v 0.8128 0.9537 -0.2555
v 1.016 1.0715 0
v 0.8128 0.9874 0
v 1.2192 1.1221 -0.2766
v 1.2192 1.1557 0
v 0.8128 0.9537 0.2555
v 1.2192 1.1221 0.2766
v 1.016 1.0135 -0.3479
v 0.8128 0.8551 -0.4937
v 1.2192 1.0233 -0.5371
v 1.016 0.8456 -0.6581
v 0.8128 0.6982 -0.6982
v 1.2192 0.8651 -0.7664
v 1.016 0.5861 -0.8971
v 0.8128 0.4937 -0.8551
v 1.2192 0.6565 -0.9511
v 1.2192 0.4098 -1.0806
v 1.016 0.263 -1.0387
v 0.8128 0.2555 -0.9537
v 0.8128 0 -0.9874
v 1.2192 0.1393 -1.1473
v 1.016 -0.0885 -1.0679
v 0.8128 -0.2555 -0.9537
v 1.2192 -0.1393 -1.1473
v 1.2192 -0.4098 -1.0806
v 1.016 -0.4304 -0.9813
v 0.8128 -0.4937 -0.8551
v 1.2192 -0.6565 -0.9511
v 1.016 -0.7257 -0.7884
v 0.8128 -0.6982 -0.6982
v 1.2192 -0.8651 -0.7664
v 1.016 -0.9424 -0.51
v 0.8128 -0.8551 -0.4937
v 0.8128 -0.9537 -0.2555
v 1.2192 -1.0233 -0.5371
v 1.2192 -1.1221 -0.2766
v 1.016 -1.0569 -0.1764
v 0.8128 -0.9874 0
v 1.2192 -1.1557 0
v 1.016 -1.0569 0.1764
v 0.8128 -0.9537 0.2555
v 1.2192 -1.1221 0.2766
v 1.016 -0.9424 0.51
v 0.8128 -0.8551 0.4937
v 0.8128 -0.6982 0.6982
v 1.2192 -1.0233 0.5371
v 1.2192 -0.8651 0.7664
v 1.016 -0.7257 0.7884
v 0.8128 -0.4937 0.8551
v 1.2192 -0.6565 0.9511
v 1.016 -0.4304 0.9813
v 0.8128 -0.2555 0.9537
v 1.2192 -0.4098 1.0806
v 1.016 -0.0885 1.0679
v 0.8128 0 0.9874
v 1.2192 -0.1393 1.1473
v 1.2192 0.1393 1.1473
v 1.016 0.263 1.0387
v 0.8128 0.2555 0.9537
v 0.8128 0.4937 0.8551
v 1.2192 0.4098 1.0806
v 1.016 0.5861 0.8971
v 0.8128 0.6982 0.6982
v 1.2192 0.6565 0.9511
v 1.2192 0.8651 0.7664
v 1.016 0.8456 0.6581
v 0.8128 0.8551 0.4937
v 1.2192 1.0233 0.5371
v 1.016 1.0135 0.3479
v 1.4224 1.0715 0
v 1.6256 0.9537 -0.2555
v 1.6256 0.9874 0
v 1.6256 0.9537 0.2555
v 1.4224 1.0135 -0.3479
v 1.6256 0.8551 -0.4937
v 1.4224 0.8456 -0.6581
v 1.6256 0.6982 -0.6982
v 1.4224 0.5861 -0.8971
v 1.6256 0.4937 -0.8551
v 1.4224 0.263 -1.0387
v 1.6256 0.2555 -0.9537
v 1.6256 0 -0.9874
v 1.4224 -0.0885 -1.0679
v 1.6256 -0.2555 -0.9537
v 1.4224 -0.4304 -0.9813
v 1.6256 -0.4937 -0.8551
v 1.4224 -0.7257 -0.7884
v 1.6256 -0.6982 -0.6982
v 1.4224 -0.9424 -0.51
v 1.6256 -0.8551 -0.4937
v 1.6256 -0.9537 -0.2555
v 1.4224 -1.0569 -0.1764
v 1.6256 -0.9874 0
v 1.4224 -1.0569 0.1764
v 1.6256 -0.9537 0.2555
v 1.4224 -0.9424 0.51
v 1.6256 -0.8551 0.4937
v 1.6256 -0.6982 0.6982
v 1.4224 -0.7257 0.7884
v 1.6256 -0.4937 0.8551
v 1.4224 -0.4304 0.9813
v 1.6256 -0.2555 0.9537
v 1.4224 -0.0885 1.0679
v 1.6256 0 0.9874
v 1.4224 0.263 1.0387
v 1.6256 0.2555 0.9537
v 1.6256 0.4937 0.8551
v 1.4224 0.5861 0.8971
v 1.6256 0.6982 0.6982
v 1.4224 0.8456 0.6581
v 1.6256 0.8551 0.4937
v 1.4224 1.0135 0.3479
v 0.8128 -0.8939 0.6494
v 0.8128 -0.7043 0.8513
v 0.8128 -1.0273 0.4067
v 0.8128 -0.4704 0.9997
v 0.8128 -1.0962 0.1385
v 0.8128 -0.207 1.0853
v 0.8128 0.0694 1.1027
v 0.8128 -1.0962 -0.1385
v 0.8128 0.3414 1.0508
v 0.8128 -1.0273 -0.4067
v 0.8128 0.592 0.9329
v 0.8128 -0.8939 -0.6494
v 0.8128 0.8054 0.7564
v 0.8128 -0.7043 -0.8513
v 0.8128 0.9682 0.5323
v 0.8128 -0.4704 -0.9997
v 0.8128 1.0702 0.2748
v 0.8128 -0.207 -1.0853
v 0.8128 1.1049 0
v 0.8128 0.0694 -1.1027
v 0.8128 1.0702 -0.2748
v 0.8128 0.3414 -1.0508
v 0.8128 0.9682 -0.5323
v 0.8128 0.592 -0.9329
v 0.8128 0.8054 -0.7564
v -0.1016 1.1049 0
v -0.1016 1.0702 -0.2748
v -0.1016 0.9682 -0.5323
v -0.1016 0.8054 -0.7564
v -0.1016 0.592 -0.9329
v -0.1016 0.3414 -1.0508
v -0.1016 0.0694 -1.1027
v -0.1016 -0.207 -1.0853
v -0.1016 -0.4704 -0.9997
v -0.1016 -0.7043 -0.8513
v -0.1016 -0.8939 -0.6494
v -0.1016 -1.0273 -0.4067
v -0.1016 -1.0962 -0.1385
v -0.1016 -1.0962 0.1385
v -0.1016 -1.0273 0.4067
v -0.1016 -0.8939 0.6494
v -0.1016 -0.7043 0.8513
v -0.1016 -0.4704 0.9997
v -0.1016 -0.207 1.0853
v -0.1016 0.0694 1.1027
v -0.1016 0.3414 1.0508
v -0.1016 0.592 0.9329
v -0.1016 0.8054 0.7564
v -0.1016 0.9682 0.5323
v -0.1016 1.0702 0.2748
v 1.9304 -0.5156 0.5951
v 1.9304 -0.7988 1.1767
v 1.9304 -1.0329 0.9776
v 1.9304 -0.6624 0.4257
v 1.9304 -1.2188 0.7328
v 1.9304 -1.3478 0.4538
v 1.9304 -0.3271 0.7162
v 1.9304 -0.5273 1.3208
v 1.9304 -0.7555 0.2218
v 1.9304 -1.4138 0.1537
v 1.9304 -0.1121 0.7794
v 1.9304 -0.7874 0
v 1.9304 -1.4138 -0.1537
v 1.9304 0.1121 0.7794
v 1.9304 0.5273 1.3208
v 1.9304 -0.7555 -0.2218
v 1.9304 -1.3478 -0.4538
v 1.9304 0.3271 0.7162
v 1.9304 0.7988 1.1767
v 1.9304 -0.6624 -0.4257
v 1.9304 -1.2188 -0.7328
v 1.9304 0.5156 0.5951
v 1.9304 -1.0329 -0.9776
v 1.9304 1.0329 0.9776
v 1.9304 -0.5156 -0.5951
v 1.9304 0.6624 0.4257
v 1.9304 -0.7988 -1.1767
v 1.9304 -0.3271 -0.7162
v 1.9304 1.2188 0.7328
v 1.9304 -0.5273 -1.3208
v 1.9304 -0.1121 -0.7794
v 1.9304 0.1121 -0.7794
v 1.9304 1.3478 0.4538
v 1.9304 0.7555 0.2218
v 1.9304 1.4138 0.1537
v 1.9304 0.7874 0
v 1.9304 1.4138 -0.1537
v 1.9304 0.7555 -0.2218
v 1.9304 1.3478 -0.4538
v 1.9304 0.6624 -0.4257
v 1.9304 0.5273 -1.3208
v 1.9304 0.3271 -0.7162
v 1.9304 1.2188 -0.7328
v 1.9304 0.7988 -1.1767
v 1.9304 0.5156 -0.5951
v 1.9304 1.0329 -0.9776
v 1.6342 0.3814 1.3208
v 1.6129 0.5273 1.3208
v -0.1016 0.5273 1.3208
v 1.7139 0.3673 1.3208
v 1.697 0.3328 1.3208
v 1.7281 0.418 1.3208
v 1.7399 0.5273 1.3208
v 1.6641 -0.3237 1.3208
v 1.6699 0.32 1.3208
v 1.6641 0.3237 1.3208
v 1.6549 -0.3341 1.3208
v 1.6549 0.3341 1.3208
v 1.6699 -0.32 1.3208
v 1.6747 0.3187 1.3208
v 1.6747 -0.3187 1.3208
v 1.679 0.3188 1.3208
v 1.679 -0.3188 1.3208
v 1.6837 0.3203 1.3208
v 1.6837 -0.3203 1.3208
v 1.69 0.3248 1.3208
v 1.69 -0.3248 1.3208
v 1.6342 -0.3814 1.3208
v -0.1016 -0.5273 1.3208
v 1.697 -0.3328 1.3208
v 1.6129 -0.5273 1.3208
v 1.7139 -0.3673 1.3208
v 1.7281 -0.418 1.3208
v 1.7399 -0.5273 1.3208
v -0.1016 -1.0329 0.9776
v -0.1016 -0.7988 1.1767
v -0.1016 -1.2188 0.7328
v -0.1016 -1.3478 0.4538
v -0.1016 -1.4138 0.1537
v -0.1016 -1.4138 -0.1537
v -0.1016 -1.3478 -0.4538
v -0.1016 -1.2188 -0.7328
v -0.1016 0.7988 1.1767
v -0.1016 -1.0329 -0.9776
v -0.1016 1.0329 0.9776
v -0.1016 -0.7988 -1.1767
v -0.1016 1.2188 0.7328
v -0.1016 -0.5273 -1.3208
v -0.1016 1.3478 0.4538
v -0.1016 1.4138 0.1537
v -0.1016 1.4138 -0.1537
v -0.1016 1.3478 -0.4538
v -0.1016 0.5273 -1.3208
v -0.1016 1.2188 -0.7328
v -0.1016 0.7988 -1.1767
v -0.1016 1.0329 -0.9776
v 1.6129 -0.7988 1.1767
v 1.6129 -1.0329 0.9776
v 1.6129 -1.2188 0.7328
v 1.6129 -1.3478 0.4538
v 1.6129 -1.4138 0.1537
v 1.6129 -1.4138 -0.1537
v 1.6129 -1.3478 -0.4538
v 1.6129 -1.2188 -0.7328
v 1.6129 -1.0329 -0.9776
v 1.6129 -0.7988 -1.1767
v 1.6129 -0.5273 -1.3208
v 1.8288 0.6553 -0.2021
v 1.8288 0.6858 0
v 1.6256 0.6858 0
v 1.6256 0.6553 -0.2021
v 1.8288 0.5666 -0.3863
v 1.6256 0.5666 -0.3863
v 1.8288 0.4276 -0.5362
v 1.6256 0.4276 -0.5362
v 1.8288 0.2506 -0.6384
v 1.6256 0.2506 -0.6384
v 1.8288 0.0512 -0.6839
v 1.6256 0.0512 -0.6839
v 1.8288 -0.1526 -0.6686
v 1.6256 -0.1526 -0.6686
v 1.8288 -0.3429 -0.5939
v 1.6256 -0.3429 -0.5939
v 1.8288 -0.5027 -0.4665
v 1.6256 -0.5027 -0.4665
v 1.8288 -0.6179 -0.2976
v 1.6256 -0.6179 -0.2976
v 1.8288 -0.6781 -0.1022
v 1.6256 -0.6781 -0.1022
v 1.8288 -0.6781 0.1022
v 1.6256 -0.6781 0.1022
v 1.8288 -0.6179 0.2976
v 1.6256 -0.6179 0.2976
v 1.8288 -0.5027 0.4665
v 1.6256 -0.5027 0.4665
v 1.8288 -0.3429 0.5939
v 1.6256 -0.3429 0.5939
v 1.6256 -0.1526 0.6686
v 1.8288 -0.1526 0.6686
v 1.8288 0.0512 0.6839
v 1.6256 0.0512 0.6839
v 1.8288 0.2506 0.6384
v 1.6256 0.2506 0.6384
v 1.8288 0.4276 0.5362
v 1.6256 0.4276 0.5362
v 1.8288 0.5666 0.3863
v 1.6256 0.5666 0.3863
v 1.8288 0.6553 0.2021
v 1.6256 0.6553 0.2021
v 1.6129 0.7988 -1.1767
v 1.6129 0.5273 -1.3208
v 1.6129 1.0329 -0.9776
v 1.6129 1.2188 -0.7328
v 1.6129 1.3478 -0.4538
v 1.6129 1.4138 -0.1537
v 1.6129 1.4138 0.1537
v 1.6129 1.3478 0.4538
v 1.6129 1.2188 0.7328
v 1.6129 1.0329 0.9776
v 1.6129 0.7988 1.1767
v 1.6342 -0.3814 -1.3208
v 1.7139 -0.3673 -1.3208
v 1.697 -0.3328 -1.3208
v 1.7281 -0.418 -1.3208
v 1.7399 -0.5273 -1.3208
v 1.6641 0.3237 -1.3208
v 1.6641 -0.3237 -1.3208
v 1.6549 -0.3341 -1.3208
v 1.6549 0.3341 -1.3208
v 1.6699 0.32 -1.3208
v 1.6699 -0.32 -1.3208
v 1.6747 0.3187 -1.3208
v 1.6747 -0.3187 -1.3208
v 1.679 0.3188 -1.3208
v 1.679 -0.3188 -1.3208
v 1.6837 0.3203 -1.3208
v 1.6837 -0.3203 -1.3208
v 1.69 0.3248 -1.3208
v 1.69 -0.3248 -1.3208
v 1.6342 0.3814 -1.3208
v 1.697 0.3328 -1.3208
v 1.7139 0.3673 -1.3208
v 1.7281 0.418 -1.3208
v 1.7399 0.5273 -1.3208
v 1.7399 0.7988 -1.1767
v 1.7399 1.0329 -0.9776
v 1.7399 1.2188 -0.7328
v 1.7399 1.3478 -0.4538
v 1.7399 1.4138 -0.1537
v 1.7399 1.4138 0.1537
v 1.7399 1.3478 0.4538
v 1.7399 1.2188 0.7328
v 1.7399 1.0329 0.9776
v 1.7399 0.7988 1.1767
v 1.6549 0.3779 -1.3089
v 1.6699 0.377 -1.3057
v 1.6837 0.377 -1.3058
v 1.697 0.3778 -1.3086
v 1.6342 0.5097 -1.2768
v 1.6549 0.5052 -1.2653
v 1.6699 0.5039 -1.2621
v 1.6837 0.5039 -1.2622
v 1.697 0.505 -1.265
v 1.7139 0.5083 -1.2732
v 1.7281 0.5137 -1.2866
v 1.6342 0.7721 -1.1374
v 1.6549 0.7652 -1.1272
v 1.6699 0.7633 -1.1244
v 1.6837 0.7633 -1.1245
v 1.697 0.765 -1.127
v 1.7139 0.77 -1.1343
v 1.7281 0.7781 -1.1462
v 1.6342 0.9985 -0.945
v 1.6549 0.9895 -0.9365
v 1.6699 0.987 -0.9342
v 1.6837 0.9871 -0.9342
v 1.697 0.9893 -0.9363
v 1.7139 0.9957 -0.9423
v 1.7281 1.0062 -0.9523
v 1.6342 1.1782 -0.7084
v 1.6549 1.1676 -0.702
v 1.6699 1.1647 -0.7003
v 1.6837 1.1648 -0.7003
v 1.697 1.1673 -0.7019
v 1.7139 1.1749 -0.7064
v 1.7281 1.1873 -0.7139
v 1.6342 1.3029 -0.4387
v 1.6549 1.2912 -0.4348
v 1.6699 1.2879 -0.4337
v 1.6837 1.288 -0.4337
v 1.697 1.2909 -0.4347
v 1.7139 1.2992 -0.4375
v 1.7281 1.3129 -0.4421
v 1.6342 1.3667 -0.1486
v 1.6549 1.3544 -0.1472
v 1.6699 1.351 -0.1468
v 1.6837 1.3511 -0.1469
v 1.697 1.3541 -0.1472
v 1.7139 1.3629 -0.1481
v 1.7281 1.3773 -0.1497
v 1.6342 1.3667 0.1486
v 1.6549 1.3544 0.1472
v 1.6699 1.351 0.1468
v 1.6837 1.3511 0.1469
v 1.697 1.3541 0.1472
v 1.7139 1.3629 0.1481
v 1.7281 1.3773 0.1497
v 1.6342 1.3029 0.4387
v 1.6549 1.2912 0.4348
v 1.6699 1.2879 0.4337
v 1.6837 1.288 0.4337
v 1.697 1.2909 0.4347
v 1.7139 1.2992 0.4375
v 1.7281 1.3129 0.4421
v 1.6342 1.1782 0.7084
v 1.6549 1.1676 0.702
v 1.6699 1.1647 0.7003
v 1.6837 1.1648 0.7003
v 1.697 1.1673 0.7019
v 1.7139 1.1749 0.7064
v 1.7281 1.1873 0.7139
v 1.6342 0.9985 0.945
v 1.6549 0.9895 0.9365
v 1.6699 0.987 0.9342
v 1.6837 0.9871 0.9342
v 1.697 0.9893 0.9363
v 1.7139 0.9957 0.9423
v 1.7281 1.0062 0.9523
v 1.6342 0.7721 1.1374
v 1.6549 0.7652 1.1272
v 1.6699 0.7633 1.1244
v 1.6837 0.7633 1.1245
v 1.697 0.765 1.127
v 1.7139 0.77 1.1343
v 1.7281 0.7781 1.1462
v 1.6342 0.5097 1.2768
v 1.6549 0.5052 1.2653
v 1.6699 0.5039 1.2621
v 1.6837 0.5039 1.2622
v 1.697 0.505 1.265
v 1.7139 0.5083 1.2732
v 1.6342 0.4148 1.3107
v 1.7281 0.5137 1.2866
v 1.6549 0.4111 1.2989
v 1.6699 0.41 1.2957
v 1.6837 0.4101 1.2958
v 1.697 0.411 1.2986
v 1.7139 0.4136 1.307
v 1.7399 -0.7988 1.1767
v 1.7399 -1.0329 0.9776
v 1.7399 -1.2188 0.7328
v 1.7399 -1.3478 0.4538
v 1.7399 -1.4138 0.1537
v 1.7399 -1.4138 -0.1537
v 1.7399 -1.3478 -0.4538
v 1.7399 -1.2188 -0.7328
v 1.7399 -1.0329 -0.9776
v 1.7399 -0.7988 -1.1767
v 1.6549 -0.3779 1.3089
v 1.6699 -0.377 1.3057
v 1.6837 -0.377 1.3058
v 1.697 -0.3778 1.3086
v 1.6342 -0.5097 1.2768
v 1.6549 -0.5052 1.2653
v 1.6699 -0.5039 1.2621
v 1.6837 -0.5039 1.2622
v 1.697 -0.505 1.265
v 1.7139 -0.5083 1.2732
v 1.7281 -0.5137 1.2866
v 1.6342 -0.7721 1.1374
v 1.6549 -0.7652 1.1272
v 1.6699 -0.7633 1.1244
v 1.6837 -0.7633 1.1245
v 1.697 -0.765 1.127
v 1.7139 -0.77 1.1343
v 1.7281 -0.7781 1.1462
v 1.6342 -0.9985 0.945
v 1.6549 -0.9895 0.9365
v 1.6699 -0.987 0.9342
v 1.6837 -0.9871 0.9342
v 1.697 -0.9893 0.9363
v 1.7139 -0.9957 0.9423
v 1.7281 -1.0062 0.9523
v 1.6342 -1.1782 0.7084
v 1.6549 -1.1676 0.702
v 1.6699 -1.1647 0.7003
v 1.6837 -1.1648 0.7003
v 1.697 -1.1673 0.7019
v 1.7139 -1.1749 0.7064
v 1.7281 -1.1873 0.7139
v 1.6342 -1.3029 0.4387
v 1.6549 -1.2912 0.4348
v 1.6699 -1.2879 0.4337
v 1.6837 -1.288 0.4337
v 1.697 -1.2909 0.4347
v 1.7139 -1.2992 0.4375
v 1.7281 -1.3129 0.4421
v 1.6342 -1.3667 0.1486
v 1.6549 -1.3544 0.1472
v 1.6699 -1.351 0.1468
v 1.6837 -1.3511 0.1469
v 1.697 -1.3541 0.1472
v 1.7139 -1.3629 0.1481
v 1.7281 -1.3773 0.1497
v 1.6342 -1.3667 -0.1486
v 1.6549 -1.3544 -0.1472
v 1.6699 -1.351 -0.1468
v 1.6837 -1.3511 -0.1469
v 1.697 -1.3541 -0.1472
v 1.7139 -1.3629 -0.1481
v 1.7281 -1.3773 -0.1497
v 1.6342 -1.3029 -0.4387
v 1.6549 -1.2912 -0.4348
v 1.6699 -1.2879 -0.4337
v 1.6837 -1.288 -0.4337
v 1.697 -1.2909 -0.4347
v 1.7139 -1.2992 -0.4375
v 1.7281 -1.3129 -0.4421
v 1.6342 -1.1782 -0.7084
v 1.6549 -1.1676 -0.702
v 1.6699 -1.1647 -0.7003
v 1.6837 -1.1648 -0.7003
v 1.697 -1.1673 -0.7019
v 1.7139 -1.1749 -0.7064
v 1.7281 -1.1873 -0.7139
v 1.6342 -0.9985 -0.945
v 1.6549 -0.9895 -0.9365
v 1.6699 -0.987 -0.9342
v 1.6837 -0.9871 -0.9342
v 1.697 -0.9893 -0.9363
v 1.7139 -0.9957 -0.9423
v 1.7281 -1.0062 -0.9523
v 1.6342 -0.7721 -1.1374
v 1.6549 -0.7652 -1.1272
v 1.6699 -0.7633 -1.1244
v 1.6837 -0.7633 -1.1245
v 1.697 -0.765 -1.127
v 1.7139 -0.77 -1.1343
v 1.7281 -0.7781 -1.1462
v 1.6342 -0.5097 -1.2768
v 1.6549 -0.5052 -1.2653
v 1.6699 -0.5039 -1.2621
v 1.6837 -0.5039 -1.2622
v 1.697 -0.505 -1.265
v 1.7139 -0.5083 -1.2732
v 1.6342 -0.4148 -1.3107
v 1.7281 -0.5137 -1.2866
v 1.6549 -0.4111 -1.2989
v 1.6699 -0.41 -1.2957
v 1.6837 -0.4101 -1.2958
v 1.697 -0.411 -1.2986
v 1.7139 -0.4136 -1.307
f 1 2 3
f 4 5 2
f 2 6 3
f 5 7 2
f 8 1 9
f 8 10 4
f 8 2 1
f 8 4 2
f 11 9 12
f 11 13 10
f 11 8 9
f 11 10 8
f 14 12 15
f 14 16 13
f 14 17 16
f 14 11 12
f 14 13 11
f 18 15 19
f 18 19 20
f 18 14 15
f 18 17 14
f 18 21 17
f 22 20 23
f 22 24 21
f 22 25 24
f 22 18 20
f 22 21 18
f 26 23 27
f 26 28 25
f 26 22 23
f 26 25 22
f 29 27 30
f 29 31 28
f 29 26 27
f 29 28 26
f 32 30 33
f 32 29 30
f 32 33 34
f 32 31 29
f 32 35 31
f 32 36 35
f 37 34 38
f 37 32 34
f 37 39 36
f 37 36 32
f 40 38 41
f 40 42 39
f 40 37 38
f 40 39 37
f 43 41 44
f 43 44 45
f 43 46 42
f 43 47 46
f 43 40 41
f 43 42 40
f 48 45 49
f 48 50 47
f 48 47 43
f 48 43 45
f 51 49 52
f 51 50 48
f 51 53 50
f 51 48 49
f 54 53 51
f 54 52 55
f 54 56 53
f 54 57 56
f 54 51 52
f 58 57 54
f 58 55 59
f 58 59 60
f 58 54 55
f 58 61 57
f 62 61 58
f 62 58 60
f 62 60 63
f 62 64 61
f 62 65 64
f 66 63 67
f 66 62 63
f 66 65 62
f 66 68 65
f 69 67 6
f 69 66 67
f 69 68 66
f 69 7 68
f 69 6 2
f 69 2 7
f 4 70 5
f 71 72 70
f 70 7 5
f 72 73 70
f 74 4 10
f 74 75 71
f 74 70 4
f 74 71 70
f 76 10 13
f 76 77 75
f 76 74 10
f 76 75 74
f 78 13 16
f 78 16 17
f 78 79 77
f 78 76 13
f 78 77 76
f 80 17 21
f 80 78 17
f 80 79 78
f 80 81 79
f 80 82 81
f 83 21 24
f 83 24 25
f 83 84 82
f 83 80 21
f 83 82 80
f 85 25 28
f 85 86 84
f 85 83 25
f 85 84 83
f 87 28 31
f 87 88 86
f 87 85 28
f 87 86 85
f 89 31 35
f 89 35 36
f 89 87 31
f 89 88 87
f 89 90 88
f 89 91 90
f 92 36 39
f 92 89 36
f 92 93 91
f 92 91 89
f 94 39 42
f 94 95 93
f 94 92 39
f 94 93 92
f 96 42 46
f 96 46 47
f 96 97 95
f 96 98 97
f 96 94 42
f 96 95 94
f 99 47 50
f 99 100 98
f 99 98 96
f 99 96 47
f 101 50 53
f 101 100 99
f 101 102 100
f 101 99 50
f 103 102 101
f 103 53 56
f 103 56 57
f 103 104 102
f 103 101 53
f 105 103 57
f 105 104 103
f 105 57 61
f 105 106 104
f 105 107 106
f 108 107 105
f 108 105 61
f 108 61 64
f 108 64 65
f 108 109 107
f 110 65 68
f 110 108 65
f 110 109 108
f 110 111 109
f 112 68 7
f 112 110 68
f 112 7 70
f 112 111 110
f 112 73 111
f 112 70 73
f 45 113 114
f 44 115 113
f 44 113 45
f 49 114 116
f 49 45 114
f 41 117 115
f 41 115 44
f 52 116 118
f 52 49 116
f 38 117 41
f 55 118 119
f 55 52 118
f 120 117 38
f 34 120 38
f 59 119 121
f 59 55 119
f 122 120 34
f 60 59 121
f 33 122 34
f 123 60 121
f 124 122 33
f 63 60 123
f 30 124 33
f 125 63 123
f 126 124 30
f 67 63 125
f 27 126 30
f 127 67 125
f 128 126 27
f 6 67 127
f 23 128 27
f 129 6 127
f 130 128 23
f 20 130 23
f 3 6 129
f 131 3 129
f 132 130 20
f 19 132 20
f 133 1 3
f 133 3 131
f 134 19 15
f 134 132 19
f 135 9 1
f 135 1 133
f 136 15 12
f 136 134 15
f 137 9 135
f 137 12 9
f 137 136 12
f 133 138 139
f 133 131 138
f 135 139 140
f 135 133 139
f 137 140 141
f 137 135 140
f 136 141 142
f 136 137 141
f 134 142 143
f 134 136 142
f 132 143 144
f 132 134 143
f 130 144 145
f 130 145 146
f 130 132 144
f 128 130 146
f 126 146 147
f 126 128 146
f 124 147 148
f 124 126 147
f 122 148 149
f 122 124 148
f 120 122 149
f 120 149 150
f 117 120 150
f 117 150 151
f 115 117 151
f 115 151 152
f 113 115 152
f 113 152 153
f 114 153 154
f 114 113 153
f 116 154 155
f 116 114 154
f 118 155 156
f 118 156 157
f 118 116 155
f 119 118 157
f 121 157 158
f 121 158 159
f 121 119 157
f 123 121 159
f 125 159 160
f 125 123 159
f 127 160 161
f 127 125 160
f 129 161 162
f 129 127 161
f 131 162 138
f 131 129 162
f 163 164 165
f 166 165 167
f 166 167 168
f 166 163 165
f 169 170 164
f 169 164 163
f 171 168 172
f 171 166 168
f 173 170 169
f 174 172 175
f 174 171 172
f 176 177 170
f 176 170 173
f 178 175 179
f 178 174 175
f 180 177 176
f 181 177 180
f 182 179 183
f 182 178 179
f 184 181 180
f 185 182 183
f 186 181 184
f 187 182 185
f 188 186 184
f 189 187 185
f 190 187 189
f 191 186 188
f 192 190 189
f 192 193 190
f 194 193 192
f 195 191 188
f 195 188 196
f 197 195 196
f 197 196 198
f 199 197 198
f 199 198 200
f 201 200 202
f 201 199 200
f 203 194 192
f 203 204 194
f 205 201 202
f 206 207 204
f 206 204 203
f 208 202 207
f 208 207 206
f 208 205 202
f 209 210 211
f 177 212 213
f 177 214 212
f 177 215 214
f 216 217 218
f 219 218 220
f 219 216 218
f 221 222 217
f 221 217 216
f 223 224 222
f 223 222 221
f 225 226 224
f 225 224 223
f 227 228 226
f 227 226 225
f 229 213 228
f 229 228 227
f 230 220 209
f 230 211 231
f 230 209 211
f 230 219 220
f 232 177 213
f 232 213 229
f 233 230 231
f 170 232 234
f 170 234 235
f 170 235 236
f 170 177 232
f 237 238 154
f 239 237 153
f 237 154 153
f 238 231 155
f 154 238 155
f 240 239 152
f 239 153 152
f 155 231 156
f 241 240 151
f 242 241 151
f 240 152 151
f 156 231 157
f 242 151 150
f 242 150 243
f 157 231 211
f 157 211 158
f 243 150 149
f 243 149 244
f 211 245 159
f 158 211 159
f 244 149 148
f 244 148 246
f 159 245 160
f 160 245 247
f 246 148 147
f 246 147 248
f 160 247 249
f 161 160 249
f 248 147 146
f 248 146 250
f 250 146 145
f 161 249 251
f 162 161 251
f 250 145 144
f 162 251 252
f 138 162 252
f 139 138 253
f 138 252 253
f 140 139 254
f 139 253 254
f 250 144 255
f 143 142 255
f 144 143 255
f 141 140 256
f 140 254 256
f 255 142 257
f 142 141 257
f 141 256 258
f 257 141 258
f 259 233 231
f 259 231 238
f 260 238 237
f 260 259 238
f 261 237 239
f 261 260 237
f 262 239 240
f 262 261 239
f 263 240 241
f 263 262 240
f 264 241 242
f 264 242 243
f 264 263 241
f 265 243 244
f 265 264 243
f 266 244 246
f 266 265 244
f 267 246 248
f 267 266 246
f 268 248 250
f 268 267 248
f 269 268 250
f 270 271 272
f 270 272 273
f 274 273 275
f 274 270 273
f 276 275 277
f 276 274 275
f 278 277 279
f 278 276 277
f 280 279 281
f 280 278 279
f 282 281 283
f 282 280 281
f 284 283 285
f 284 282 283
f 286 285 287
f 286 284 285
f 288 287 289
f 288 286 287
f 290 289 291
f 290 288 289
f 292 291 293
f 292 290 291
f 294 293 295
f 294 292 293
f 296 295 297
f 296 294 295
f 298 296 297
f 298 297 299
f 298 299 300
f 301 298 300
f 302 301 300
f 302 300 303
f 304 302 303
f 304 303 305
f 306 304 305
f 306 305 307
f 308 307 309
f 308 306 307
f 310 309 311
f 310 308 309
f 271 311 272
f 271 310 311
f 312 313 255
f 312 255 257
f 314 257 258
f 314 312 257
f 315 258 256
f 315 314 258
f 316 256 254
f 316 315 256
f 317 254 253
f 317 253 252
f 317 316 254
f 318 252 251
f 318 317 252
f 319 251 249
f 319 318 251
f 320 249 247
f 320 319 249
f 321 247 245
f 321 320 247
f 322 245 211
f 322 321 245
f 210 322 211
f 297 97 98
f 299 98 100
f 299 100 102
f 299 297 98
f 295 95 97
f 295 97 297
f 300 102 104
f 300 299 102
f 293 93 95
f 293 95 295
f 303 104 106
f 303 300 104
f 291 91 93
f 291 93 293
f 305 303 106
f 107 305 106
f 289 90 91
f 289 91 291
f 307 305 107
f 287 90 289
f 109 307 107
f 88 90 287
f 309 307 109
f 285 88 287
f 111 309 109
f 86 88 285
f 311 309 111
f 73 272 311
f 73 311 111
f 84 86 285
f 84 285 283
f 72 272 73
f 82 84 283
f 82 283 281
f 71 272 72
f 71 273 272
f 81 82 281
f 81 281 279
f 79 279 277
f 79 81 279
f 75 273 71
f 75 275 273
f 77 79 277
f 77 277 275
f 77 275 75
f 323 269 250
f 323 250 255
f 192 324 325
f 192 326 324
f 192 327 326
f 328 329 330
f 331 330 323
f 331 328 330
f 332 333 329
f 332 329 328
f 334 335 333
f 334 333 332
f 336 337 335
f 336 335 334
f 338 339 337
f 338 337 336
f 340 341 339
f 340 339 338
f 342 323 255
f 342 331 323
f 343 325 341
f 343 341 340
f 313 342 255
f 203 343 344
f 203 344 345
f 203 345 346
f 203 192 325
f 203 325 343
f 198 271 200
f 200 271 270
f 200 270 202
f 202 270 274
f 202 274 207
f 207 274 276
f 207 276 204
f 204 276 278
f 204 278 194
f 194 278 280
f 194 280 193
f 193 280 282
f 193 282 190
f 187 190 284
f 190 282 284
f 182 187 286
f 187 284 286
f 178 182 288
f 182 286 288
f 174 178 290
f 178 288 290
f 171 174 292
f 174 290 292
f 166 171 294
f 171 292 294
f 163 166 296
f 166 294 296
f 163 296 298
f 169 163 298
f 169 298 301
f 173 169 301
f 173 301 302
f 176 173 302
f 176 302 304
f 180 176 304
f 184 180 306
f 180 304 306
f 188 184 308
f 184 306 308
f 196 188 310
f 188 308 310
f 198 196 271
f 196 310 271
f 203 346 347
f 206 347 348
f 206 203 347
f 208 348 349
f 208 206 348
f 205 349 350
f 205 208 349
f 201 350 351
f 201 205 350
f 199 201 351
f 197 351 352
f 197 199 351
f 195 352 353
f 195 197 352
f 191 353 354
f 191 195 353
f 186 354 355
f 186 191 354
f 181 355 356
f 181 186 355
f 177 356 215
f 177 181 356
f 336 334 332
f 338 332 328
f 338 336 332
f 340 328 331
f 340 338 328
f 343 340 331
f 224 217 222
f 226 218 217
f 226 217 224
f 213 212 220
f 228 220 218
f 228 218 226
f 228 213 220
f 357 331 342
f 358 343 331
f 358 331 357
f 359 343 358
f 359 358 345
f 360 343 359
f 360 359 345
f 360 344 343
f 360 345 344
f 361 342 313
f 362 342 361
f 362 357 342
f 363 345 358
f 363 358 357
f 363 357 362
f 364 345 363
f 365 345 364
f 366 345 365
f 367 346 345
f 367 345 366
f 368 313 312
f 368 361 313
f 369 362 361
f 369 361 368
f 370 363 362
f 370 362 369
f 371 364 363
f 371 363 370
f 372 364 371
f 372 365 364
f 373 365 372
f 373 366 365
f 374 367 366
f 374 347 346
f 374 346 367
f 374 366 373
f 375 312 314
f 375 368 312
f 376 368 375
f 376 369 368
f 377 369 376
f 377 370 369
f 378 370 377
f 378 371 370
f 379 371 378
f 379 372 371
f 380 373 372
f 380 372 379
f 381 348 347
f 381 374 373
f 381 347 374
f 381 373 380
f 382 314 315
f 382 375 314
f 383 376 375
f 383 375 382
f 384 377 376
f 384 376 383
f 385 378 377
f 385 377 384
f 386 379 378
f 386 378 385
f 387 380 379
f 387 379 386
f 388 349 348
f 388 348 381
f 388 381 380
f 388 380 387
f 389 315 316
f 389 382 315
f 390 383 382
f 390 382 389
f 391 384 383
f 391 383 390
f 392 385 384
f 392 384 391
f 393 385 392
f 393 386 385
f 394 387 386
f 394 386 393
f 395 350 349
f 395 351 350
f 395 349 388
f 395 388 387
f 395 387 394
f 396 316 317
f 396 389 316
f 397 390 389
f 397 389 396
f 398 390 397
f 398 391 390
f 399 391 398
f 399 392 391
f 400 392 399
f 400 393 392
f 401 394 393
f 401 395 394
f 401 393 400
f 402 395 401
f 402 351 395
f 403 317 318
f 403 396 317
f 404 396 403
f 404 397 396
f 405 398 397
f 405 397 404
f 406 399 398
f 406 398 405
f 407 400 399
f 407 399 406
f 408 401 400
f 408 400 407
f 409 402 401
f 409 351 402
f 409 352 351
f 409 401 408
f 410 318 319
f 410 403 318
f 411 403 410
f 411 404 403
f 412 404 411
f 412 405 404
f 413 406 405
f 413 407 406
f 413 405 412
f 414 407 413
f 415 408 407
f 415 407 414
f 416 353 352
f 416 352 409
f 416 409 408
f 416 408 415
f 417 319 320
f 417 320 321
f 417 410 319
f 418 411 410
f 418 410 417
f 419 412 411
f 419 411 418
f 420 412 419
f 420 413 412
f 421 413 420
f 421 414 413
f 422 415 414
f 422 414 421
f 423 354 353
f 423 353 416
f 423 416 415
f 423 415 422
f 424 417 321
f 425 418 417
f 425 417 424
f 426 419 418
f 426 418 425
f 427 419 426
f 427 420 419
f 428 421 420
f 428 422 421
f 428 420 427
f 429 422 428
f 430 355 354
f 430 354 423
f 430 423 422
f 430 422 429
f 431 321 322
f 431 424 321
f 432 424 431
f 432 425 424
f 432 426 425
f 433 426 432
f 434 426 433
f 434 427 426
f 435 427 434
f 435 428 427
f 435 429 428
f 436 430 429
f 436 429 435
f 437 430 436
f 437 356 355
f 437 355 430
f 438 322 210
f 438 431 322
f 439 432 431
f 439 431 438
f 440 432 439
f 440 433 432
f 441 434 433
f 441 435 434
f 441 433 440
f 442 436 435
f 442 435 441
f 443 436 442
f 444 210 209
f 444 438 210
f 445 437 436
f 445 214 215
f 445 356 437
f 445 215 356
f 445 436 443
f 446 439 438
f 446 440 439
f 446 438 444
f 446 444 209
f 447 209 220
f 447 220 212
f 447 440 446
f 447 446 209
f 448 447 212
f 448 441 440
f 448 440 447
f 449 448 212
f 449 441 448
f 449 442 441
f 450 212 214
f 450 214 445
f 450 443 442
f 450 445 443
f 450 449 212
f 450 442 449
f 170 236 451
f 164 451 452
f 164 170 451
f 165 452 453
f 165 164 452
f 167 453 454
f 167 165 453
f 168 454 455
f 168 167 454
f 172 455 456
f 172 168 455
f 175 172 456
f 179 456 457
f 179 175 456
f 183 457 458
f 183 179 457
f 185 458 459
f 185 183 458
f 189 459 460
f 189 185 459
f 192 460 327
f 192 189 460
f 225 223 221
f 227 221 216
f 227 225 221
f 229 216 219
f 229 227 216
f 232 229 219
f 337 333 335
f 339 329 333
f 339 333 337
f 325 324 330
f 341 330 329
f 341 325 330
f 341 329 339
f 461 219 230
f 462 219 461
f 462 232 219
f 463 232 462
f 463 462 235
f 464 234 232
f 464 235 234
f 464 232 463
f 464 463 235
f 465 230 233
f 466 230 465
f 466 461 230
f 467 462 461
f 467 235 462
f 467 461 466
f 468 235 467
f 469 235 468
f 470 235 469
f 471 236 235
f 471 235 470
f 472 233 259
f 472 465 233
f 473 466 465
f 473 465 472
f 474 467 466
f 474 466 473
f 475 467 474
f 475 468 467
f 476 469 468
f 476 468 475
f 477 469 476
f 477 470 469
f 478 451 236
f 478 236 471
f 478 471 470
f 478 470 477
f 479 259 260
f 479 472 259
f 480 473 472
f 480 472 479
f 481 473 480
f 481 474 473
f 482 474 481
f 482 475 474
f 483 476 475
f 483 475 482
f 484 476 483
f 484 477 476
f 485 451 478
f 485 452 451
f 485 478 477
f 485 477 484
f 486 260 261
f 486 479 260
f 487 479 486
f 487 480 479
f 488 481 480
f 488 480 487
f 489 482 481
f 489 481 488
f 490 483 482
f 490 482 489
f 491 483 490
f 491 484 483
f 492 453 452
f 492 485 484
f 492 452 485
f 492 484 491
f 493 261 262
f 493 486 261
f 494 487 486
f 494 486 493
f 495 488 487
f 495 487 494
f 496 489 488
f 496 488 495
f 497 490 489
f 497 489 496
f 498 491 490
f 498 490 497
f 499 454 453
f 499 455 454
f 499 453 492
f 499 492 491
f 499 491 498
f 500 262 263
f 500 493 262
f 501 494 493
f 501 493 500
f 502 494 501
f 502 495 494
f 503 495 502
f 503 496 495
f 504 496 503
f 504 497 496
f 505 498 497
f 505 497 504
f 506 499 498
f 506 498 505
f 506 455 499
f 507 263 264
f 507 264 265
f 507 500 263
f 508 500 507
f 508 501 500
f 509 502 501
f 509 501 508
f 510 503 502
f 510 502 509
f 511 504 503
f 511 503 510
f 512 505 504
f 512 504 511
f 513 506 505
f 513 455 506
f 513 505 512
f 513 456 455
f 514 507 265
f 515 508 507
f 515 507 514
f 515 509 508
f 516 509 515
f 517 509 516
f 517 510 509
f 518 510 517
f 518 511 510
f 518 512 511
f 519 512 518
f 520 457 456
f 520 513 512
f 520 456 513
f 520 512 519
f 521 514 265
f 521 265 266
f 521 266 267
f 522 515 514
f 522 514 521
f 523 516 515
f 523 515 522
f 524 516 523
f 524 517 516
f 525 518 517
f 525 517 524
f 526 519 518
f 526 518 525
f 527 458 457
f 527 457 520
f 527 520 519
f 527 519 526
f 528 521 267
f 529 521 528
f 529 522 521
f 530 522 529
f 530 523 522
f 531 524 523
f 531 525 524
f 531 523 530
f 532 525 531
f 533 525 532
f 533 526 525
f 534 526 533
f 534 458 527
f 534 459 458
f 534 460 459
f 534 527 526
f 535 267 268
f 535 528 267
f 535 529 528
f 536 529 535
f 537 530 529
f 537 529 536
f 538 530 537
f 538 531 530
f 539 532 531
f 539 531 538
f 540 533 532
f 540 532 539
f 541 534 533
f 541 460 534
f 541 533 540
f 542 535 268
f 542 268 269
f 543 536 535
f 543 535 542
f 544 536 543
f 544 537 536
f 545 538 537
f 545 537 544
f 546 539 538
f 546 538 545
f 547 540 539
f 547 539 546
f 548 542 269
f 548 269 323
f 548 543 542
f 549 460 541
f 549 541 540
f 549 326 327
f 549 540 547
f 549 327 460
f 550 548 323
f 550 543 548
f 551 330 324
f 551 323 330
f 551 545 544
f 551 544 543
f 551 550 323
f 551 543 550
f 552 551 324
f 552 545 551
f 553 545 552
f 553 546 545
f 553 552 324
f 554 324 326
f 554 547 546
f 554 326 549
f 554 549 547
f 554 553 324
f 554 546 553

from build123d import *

# Parameters (mm, degrees)
BOSS_EXTRUDE1_DEPTH = 2.032
CHAMFER1_SIZE       = 0.1016


with BuildPart() as part:
    # Sketch1 → Boss-Extrude1 (new body)
    with BuildSketch(Plane(origin=(1.9304, 0, 0), x_dir=(0, 0, -1), z_dir=(1, 0, 0))):
        with BuildLine():
            Line((1.3208, -0.527317703), (1.3208, 0.527317703))
            ThreePointArc((1.3208, 0.527317703), (0, 1.422173196), (-1.3208, 0.527317703))
            Line((-1.3208, 0.527317703), (-1.3208, -0.527317703))
            ThreePointArc((-1.3208, -0.527317703), (0, -1.422173196), (1.3208, -0.527317703))
        make_face()
    extrude(amount=-BOSS_EXTRUDE1_DEPTH)

    # Sketch2 → Cut-Revolve1 (revolve, cut)
    with BuildSketch(Plane(origin=(0, 0, 0), x_dir=(-1, 0, 0), z_dir=(0, 0, -1))):
        Polygon((-1.9304, 0.6858), (-1.9304, 0), (0.1016, 0), (0.1016, 1.1049), (-0.8128, 1.1049), (-0.8128, 0.987363608), (-1.2192, 1.1557), (-1.6256, 0.987363608), (-1.6256, 0.6858), align=None)
    revolve(axis=Axis((1.9304, 0, 0), (-1, 0, 0)), mode=Mode.SUBTRACT)

    # Chamfer1
    chamfer1_edges = [part.edges().sort_by_distance(p)[0] for p in [
        (1.9304, -0.6858, 0),
    ]]
    chamfer(chamfer1_edges, length=CHAMFER1_SIZE)

    # Sketch3 → Cut-Revolve2 (revolve, cut)
    with BuildSketch(Plane.XY):
        with BuildLine():
            Line((1.7399, 1.422173196), (1.6129, 1.422173196))
            ThreePointArc((1.6129, 1.422173196), (1.6764, 1.358673196), (1.7399, 1.422173196))
        make_face()
    revolve(axis=Axis((-0.1016, 0, 0), (1, 0, 0)), mode=Mode.SUBTRACT)


solid = part.part
